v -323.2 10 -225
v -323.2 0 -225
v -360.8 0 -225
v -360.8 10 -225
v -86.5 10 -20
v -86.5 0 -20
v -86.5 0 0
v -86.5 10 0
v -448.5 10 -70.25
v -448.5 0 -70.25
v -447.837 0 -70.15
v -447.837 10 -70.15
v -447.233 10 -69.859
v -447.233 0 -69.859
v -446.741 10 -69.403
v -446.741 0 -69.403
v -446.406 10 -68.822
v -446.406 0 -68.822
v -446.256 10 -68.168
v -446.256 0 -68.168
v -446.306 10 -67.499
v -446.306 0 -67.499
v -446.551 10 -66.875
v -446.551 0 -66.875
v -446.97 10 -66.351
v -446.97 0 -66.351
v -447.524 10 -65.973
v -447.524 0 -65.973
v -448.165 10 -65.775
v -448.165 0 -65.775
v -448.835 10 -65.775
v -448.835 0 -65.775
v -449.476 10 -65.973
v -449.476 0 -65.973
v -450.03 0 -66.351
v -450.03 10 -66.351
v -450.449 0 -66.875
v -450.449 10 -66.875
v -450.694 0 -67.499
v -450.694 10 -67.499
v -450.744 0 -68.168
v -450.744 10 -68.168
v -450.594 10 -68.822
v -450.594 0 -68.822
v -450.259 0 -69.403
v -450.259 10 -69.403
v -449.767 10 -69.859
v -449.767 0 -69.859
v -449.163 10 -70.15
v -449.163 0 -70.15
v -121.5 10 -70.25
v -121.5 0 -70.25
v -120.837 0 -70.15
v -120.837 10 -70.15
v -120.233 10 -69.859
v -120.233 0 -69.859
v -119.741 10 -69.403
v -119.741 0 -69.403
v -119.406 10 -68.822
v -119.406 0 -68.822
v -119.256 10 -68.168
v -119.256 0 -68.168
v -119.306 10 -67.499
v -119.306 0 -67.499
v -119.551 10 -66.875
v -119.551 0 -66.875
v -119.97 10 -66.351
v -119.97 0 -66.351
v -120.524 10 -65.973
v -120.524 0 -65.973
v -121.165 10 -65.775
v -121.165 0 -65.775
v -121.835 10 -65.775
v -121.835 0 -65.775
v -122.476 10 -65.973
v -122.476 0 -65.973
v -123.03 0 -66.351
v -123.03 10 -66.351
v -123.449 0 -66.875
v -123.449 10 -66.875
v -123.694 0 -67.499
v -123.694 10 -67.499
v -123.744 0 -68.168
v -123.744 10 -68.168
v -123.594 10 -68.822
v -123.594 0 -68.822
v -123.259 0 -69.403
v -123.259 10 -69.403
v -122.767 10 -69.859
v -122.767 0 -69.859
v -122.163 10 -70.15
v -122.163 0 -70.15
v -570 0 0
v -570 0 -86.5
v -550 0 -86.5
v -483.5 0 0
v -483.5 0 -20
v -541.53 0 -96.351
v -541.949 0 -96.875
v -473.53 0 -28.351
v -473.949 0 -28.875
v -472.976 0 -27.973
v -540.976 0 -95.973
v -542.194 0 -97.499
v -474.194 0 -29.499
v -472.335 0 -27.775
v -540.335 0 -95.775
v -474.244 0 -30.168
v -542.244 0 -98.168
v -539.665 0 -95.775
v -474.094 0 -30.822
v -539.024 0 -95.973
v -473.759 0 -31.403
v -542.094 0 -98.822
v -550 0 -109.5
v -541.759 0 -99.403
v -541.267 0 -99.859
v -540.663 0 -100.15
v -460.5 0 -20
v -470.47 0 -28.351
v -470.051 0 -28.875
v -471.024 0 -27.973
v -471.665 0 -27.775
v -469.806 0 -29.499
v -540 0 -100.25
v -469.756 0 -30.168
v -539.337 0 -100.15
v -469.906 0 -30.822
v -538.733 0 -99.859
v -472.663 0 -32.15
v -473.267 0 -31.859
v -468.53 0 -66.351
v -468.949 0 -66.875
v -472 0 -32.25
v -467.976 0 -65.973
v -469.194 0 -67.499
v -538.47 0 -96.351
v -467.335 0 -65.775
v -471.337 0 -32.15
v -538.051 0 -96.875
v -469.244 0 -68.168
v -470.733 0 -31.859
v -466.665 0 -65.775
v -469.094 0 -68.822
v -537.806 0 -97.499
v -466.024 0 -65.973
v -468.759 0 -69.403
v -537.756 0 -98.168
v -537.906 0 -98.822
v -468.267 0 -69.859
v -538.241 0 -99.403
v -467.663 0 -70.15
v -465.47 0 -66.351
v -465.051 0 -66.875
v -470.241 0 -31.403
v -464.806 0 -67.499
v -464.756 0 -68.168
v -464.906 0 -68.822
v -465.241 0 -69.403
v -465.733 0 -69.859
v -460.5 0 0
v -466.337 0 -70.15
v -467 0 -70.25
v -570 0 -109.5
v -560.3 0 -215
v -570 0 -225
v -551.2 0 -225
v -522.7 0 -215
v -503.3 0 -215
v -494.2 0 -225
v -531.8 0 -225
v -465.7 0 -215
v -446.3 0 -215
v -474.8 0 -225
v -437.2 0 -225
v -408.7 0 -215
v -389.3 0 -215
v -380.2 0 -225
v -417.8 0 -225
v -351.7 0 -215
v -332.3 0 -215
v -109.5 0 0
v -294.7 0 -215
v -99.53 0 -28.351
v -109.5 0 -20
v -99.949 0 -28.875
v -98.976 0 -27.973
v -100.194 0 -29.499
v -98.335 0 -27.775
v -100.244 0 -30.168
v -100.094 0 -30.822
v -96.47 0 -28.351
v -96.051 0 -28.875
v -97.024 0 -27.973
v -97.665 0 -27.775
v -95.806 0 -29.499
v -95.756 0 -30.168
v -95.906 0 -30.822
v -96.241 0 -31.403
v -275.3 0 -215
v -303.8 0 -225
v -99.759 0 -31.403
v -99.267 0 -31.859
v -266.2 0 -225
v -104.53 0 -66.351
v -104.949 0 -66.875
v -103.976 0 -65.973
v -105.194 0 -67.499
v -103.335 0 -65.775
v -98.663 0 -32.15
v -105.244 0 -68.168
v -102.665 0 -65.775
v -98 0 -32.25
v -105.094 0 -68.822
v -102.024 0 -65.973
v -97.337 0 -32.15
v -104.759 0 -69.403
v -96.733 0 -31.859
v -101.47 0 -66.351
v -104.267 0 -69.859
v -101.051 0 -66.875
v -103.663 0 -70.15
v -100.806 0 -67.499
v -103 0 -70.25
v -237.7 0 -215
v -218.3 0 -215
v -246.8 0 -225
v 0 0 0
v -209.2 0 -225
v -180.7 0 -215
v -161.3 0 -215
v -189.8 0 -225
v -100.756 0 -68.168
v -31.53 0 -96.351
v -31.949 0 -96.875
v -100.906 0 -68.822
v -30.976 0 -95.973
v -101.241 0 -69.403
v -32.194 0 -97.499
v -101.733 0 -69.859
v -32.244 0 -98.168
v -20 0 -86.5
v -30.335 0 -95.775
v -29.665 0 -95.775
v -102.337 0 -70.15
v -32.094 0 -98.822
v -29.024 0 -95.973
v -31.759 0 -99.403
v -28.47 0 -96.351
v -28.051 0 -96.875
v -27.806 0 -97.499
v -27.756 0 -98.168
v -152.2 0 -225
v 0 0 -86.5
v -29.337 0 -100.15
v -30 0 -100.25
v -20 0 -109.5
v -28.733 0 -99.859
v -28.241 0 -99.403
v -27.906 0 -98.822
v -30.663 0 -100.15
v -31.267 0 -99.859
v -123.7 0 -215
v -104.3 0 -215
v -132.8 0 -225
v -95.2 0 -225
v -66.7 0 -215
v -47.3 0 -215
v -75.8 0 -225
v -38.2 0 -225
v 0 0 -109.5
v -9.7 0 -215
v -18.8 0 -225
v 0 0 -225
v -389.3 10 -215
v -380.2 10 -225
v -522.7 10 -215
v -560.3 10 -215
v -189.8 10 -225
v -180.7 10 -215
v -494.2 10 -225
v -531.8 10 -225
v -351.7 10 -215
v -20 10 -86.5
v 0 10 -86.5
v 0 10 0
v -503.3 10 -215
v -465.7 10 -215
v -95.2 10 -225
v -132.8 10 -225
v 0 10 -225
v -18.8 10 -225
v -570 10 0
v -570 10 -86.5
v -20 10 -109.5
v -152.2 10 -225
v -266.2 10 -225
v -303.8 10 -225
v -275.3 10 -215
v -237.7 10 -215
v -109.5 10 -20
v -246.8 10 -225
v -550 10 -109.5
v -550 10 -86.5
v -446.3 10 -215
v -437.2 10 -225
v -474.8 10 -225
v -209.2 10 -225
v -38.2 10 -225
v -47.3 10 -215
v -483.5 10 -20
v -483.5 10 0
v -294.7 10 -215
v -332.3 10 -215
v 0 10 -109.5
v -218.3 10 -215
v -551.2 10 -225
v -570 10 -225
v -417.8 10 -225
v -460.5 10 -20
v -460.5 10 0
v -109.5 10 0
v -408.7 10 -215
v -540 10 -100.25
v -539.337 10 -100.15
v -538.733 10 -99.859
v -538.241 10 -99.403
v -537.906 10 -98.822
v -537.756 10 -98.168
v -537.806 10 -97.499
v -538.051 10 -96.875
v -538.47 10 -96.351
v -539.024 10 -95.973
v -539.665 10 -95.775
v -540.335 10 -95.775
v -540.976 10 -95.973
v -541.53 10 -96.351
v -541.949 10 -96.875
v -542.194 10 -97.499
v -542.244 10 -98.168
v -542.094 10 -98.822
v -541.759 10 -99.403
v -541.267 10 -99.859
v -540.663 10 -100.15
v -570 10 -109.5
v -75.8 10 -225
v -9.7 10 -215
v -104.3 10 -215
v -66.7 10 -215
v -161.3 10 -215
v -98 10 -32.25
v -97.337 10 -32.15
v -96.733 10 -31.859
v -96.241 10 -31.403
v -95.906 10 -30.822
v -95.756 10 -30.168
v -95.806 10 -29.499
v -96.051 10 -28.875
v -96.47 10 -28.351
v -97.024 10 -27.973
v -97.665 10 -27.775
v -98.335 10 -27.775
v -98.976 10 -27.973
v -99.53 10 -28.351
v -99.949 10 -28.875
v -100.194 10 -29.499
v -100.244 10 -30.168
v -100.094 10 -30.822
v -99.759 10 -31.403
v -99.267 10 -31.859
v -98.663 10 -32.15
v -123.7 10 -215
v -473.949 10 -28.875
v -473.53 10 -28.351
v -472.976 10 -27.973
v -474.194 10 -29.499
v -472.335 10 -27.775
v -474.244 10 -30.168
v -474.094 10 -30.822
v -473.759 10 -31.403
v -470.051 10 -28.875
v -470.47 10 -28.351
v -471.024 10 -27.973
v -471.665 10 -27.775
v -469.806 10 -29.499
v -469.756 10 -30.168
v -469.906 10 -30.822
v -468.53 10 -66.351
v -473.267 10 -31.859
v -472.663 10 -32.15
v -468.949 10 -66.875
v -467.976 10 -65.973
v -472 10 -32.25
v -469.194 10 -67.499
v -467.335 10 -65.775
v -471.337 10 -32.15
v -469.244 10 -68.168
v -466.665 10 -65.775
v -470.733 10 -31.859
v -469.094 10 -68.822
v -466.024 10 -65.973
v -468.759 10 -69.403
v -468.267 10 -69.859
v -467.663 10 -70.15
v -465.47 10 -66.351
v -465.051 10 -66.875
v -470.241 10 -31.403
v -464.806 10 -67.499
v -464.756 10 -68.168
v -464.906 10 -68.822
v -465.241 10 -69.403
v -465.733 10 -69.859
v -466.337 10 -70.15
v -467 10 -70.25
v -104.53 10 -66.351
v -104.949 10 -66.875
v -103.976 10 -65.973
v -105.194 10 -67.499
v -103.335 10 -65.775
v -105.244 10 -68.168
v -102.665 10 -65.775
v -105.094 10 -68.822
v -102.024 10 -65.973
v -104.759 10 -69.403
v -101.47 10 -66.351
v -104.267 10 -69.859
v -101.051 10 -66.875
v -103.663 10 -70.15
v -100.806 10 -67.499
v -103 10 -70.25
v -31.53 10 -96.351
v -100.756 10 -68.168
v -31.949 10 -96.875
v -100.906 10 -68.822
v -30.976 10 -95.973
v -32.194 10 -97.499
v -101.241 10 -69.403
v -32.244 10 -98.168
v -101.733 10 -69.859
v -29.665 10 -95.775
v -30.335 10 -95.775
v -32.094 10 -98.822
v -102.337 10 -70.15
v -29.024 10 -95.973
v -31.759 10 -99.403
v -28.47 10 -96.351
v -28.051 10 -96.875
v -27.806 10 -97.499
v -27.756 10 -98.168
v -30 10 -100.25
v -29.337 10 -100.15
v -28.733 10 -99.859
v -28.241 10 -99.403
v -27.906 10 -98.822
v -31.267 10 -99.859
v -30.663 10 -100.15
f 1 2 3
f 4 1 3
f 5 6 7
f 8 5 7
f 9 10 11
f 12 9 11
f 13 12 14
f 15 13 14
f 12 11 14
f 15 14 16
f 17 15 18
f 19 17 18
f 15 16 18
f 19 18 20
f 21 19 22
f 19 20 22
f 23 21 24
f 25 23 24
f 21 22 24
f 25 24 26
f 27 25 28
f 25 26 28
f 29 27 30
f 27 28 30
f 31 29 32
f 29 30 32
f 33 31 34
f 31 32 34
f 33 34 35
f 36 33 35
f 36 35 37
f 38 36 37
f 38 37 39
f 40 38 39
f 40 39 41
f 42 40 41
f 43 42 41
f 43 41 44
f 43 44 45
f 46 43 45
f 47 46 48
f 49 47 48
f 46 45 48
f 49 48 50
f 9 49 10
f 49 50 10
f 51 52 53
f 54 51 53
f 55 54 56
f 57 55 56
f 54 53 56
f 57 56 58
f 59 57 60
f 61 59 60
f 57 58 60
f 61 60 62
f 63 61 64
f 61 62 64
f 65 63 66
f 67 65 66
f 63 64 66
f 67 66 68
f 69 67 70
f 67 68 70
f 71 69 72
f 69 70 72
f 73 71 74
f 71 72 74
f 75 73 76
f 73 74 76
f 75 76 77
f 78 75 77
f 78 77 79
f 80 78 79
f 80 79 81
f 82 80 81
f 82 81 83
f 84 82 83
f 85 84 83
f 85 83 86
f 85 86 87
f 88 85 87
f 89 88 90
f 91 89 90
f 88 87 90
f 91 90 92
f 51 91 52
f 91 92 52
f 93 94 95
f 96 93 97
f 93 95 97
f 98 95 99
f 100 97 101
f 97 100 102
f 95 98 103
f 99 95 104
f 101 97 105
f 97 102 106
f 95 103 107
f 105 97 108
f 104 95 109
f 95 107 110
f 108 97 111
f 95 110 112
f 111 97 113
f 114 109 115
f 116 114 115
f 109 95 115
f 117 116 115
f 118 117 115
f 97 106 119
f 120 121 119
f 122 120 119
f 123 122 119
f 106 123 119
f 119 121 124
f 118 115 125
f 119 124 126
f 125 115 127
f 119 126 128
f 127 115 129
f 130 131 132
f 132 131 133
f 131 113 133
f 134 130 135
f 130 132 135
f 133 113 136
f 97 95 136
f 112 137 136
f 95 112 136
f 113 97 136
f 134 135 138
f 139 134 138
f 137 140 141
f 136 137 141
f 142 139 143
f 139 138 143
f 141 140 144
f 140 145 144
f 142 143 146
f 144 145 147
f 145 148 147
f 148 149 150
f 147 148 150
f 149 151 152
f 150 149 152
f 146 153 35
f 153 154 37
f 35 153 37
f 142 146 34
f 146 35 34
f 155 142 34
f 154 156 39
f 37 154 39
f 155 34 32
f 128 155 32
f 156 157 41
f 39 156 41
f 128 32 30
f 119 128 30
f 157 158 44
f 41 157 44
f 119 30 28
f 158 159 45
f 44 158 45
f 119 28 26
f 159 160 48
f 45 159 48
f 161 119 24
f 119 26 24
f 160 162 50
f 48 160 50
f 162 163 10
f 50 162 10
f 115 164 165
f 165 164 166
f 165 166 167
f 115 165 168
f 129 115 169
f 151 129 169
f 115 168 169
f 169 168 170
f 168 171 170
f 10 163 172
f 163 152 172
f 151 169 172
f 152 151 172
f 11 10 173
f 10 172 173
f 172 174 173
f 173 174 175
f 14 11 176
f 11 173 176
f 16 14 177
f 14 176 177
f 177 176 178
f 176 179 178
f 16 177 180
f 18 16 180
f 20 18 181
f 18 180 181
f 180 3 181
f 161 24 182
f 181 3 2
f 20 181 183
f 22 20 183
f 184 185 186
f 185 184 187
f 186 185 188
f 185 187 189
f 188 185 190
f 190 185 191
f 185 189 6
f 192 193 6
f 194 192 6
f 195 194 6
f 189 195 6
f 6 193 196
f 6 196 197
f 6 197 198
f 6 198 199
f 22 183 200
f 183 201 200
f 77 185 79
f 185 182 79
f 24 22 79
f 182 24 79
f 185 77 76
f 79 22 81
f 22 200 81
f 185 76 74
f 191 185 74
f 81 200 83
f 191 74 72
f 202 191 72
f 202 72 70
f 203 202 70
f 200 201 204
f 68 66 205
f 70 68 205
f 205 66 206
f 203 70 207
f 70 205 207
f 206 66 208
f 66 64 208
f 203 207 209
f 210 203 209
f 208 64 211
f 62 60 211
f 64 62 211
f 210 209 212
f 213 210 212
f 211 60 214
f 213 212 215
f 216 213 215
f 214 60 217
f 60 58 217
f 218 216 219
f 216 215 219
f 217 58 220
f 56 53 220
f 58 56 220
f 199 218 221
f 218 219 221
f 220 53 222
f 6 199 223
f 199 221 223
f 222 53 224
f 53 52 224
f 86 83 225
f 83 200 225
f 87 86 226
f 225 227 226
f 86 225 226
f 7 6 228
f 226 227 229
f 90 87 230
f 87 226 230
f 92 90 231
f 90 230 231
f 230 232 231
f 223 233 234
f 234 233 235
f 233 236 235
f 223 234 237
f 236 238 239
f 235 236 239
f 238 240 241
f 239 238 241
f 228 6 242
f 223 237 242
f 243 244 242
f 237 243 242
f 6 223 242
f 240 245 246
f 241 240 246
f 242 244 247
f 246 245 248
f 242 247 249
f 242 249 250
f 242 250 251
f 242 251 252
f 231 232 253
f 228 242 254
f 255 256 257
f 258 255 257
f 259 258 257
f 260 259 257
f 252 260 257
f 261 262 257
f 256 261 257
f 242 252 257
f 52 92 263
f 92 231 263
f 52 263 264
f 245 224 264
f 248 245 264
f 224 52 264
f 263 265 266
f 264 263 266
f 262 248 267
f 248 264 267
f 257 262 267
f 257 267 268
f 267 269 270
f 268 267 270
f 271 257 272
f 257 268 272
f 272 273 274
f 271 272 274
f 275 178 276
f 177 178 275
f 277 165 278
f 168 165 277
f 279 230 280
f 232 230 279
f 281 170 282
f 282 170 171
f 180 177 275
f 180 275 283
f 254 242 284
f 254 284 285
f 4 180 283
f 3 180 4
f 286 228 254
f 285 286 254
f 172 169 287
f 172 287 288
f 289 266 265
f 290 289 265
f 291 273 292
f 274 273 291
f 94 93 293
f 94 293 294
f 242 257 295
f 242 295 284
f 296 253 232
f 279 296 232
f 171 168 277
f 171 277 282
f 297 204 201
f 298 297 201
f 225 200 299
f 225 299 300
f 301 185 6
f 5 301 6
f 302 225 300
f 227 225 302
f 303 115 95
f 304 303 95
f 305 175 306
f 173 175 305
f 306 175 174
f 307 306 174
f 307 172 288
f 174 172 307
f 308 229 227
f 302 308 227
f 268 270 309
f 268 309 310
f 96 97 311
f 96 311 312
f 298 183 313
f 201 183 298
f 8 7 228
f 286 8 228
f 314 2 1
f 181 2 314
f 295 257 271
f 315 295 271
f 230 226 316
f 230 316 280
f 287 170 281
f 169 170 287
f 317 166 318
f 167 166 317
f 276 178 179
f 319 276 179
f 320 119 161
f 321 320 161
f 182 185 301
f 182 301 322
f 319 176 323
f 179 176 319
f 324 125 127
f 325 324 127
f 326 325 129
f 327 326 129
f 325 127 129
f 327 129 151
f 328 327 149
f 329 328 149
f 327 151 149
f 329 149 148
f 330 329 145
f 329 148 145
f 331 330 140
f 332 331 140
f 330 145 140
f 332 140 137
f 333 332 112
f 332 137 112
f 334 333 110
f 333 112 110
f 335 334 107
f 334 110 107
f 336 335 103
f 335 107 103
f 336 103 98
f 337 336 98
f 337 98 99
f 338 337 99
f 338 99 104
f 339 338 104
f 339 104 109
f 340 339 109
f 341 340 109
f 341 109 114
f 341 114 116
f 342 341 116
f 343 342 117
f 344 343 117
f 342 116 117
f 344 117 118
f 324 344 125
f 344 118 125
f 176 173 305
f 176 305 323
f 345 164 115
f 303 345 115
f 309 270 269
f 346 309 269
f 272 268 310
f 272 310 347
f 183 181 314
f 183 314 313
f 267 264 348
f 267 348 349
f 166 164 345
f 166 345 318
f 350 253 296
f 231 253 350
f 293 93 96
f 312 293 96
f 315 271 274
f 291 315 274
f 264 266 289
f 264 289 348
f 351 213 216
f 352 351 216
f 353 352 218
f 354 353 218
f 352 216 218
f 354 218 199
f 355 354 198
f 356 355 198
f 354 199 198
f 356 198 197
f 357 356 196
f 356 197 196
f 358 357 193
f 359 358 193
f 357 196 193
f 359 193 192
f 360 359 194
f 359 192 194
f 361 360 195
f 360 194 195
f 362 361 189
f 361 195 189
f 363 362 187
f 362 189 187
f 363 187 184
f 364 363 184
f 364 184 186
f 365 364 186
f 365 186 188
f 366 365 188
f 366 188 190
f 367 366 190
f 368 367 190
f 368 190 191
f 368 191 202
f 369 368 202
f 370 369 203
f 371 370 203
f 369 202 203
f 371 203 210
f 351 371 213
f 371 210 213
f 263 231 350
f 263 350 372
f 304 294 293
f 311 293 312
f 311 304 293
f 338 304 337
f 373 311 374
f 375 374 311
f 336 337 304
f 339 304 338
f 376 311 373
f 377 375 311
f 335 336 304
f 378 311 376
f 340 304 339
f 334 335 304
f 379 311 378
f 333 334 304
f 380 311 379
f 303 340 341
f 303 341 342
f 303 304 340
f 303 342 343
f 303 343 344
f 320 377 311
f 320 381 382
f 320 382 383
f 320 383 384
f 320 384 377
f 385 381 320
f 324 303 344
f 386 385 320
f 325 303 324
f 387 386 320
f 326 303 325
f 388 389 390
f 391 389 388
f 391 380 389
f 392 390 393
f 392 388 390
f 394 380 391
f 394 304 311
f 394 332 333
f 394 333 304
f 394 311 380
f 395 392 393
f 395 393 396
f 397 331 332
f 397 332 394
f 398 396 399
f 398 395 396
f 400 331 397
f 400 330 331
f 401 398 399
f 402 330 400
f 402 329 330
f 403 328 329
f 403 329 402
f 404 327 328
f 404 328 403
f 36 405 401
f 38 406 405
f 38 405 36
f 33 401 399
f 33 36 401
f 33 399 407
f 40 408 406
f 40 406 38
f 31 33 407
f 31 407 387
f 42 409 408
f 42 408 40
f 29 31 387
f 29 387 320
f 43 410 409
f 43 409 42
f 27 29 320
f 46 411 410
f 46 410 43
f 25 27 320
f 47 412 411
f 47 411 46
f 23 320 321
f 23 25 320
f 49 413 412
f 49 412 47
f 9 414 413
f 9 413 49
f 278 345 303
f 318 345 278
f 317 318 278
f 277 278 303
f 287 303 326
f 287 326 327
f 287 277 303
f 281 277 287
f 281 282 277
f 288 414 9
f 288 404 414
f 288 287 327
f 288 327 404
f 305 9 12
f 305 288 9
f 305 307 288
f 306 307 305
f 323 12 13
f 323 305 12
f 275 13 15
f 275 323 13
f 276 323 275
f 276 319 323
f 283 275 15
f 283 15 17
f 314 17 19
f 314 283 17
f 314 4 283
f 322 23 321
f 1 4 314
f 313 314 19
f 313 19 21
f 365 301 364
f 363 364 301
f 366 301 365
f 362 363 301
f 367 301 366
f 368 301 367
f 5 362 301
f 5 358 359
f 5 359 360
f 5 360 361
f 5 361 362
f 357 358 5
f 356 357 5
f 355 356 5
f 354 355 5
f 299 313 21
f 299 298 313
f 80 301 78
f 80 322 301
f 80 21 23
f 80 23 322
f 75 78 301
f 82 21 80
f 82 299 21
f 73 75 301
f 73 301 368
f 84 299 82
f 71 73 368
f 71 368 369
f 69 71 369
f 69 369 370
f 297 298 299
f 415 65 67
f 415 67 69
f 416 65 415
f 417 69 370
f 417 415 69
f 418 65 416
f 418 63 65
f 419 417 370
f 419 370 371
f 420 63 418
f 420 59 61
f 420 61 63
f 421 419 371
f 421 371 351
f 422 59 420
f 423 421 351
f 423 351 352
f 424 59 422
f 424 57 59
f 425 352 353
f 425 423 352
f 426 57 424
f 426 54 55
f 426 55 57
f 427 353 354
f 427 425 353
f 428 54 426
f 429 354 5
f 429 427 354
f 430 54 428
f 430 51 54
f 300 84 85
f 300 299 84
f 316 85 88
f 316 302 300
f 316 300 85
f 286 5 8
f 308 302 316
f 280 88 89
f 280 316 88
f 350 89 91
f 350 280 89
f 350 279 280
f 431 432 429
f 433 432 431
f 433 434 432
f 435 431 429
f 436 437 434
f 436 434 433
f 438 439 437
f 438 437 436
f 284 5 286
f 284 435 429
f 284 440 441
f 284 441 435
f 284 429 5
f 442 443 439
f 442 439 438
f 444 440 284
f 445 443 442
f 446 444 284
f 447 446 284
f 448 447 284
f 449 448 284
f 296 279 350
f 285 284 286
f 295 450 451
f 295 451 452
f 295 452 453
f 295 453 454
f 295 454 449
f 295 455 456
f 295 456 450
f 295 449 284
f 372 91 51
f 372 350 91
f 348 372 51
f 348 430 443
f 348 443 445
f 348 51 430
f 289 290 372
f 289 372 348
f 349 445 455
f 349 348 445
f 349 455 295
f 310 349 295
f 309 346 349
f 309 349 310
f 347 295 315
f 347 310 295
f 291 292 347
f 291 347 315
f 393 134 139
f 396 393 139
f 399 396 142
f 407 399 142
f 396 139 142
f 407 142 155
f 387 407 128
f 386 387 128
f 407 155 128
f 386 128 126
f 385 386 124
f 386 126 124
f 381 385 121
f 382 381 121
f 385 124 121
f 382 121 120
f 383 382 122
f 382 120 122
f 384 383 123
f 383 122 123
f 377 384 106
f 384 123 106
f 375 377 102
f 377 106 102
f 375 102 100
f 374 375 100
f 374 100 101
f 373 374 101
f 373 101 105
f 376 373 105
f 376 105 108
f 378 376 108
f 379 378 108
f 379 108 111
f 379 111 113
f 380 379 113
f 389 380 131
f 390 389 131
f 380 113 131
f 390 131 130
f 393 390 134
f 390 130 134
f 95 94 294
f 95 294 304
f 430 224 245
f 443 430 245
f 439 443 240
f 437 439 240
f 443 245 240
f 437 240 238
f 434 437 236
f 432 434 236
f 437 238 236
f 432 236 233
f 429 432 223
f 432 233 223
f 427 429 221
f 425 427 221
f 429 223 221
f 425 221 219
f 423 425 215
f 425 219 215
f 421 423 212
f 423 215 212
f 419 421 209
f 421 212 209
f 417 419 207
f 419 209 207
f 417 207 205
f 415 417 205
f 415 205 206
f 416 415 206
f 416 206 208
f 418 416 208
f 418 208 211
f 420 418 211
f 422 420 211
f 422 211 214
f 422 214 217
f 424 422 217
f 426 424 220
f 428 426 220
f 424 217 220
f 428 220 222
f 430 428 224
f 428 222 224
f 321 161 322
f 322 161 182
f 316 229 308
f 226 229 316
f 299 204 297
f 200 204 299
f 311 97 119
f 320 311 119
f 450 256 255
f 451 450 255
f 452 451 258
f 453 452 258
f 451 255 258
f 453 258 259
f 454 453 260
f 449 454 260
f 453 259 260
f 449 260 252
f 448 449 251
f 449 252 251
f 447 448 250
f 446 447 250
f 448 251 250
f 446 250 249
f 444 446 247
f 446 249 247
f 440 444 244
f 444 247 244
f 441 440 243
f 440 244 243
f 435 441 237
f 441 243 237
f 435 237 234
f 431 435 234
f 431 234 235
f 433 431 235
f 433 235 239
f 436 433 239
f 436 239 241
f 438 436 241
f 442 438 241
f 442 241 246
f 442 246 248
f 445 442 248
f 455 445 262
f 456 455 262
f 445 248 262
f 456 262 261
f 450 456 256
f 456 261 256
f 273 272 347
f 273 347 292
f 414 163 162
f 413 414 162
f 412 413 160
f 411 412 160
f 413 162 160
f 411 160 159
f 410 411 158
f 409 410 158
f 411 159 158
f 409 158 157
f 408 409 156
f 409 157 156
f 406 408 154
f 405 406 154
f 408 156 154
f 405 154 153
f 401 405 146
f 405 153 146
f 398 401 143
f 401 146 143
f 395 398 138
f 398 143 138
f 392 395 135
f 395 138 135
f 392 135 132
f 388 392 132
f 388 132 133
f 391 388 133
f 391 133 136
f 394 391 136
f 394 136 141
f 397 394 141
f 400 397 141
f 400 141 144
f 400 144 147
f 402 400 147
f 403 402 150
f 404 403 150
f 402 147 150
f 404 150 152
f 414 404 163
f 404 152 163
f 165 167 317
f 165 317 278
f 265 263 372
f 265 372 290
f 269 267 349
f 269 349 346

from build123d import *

# Parameters (mm, degrees)
SCHIZZO1_W                   = 570
SCHIZZO1_H                   = 450
ESTRUSIONE_ESTRUSIONE1_DEPTH = 10
SCHIZZO2_R                   = 2.25
SCHIZZO2_W                   = 23
SCHIZZO2_H                   = 20
SCHIZZO2_W_2                 = 20
SCHIZZO2_H_2                 = 23
TAGLIO_ESTRUSIONE1_DEPTH     = 10
TAGLIO_ESTRUSIONE2_DEPTH     = 10


with BuildPart() as part:
    # Schizzo1 → Estrusione-Estrusione1 (new body)
    with BuildSketch(Plane(origin=(0, 0, 0), x_dir=(1, 0, 0), z_dir=(0, 1, 0))):
        with Locations((-285, 225)):
            Rectangle(SCHIZZO1_W, SCHIZZO1_H)
    extrude(amount=ESTRUSIONE_ESTRUSIONE1_DEPTH)

    # Schizzo2 → Taglio-Estrusione1 (cut)
    with BuildSketch(Plane.XZ):
        with Locations(Location((-467, -68, 0), (0, 0, 270))):
            Circle(SCHIZZO2_R)
        with Locations(Location((-448.5, -68, 0), (0, 0, 270))):
            Circle(SCHIZZO2_R)
        with Locations(Location((-121.5, -68, 0), (0, 0, 270))):
            Circle(SCHIZZO2_R)
        with Locations(Location((-103, -68, 0), (0, 0, 270))):
            Circle(SCHIZZO2_R)
        with Locations(Location((-467, -382, 0), (0, 0, 270))):
            Circle(SCHIZZO2_R)
        with Locations(Location((-448.5, -382, 0), (0, 0, 270))):
            Circle(SCHIZZO2_R)
        with Locations(Location((-121.5, -382, 0), (0, 0, 270))):
            Circle(SCHIZZO2_R)
        with Locations(Location((-103, -382, 0), (0, 0, 270))):
            Circle(SCHIZZO2_R)
        with Locations(Location((-472, -420, 0), (0, 0, 270))):
            Circle(SCHIZZO2_R)
        with Locations(Location((-540, -352, 0), (0, 0, 270))):
            Circle(SCHIZZO2_R)
        with Locations(Location((-540, -98, 0), (0, 0, 270))):
            Circle(SCHIZZO2_R)
        with Locations(Location((-472, -30, 0), (0, 0, 270))):
            Circle(SCHIZZO2_R)
        with Locations(Location((-98, -30, 0), (0, 0, 270))):
            Circle(SCHIZZO2_R)
        with Locations(Location((-30, -98, 0), (0, 0, 270))):
            Circle(SCHIZZO2_R)
        with Locations(Location((-30, -352, 0), (0, 0, 270))):
            Circle(SCHIZZO2_R)
        with Locations(Location((-98, -420, 0), (0, 0, 270))):
            Circle(SCHIZZO2_R)
        with Locations((-472, -10)):
            Rectangle(SCHIZZO2_W, SCHIZZO2_H)
        with Locations((-98, -10)):
            Rectangle(SCHIZZO2_W, SCHIZZO2_H)
        with Locations((-10, -98)):
            Rectangle(SCHIZZO2_W_2, SCHIZZO2_H_2)
        with Locations((-10, -352)):
            Rectangle(SCHIZZO2_W_2, SCHIZZO2_H_2)
        with Locations((-98, -440)):
            Rectangle(SCHIZZO2_W, SCHIZZO2_H)
        with Locations((-472, -440)):
            Rectangle(SCHIZZO2_W, SCHIZZO2_H)
        with Locations((-560, -352)):
            Rectangle(SCHIZZO2_W_2, SCHIZZO2_H_2)
        with Locations((-560, -98)):
            Rectangle(SCHIZZO2_W_2, SCHIZZO2_H_2)
    extrude(amount=-TAGLIO_ESTRUSIONE1_DEPTH, mode=Mode.SUBTRACT)

    # Schizzo3 → Taglio-Estrusione2 (cut)
    with BuildSketch(Plane.XZ):
        Polygon((-570, -225), (-551.2, -225), (-560.3, -215), (-522.7, -215), (-531.8, -225), (-513, -225), (-494.2, -225), (-503.3, -215), (-465.7, -215), (-474.8, -225), (-456, -225), (-437.2, -225), (-446.3, -215), (-408.7, -215), (-417.8, -225), (-399, -225), (-380.2, -225), (-389.3, -215), (-351.7, -215), (-360.8, -225), (-342, -225), (-323.2, -225), (-332.3, -215), (-294.7, -215), (-303.8, -225), (-285, -225), (-266.2, -225), (-275.3, -215), (-237.7, -215), (-246.8, -225), (-228, -225), (-209.2, -225), (-218.3, -215), (-180.7, -215), (-189.8, -225), (-171, -225), (-152.2, -225), (-161.3, -215), (-123.7, -215), (-132.8, -225), (-114, -225), (-95.2, -225), (-104.3, -215), (-66.7, -215), (-75.8, -225), (-57, -225), (-38.2, -225), (-47.3, -215), (-9.7, -215), (-18.8, -225), (0, -225), (0, -450), (-570, -450), align=None)
    extrude(amount=-TAGLIO_ESTRUSIONE2_DEPTH, mode=Mode.SUBTRACT)


solid = part.part
